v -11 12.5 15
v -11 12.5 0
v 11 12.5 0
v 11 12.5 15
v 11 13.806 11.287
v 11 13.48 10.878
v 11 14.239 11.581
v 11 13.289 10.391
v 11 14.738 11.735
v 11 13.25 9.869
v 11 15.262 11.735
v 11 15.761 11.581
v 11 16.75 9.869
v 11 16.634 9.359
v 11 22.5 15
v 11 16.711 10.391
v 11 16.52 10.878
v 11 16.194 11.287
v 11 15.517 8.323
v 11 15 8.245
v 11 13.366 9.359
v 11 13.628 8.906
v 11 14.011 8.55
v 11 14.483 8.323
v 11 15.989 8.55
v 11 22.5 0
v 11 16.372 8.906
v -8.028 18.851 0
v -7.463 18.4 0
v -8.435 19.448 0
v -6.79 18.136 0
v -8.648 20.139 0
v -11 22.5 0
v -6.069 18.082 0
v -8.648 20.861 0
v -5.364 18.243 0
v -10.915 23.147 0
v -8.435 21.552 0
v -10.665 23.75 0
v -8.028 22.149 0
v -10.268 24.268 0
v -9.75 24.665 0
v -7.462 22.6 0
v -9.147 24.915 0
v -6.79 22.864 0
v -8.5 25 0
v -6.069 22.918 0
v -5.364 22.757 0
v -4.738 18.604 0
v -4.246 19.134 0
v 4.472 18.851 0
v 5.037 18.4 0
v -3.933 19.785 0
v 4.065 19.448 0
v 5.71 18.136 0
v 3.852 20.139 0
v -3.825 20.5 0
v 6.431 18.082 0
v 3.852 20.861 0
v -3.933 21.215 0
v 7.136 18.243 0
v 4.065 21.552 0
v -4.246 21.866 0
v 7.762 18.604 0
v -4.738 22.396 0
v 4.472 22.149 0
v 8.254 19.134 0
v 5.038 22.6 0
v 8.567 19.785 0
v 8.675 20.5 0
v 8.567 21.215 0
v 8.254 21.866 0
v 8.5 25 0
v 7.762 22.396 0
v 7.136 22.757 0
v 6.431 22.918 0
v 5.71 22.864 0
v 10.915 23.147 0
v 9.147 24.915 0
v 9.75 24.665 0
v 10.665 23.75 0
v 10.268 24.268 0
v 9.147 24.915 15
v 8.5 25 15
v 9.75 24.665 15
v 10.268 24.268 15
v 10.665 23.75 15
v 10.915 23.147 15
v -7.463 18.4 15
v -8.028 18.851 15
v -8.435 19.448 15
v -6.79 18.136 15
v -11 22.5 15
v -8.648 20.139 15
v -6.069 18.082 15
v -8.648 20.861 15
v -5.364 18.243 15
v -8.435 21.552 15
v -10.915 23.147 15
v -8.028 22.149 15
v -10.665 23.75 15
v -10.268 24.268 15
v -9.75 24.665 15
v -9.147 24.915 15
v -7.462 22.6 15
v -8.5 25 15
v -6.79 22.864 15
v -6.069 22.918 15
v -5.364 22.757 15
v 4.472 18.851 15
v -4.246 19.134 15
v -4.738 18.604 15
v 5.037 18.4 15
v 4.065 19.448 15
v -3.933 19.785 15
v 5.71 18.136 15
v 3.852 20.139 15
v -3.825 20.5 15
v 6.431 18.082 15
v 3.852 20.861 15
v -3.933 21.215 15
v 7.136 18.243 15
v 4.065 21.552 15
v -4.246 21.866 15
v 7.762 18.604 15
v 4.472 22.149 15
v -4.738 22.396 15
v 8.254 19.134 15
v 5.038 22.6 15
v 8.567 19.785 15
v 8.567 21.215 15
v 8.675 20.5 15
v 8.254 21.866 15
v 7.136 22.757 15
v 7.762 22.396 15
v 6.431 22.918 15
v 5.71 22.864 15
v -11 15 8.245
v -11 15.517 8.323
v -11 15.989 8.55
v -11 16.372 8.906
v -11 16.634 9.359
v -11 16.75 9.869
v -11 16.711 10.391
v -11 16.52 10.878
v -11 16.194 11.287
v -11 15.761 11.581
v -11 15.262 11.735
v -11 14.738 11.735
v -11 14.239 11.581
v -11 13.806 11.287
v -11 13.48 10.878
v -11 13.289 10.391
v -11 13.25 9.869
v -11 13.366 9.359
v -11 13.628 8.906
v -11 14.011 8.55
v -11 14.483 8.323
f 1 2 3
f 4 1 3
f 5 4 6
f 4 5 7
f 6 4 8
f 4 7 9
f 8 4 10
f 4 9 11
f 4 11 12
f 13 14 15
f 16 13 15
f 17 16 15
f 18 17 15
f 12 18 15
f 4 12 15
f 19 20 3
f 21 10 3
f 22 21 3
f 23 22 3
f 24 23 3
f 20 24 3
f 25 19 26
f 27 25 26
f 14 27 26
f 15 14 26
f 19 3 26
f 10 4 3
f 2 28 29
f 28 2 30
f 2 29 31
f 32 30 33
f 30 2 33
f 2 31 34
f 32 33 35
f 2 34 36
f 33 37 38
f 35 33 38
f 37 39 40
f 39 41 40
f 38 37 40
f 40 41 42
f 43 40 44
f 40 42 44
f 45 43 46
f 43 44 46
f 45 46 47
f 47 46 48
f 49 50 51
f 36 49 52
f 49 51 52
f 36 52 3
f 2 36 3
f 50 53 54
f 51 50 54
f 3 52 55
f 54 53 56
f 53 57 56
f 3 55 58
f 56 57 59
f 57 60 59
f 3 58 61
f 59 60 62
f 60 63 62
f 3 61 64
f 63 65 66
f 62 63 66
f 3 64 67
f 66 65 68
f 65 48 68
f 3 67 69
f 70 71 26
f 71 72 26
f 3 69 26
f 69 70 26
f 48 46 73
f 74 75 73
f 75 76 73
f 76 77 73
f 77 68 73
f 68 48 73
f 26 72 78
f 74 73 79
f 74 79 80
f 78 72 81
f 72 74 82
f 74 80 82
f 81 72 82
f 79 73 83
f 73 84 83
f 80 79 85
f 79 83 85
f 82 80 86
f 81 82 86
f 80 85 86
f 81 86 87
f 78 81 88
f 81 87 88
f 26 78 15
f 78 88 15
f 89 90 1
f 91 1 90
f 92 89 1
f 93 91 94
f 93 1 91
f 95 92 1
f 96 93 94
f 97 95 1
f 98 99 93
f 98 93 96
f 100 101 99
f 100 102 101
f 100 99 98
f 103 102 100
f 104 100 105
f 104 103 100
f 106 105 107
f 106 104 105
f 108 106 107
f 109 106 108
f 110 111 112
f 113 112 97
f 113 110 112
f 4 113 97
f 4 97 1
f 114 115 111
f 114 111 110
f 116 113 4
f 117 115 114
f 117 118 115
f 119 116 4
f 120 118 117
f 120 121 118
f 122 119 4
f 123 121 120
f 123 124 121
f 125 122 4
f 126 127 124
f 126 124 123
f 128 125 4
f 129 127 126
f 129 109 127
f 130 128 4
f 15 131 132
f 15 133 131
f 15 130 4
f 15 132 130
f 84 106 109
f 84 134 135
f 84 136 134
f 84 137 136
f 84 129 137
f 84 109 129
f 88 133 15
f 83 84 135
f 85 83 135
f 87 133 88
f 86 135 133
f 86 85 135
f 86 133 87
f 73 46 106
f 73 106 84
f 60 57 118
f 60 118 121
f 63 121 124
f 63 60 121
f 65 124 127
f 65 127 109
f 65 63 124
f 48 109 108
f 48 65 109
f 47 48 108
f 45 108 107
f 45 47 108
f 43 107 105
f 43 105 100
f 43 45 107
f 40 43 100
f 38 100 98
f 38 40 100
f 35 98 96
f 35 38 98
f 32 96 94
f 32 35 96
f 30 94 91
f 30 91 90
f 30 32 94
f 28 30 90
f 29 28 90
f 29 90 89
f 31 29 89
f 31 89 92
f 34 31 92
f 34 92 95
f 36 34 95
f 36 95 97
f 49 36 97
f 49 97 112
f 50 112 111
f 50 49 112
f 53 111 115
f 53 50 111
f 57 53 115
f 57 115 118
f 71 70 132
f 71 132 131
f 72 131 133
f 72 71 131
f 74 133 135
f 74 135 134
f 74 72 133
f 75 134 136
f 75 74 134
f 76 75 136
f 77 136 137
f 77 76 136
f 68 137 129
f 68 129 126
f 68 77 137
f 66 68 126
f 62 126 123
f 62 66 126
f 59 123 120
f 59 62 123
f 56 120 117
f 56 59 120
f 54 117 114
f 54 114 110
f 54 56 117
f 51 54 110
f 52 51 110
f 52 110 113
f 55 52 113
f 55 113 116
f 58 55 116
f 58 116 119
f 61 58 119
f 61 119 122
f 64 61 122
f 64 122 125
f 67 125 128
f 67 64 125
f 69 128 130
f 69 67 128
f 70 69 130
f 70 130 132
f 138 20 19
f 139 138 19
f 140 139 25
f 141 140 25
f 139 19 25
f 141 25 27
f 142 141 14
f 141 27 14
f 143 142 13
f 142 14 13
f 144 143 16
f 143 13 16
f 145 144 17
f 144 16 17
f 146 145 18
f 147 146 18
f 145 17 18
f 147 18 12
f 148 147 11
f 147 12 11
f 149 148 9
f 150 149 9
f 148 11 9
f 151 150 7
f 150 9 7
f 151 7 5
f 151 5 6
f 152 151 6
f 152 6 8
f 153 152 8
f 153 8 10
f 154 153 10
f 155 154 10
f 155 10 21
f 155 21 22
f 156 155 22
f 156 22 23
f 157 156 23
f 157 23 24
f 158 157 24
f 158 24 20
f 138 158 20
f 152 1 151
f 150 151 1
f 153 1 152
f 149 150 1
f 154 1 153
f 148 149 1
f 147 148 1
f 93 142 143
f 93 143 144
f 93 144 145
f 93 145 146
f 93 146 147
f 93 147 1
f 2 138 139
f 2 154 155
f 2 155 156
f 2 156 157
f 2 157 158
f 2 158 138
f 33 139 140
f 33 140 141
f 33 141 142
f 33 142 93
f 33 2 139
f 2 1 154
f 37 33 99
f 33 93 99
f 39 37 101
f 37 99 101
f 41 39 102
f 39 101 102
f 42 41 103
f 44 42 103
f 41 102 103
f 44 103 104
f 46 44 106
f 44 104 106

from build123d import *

# Parameters (mm, degrees)
SKETCH2_W           = 22
SKETCH2_H           = 12.5
SKETCH2_R           = 2.425
BOSS_EXTRUDE1_DEPTH = 15
SKETCH3_R           = 1.755
CUT_EXTRUDE1_DEPTH  = 30
FILLET1_R           = 2.5


with BuildPart() as part:
    # Sketch2 → Boss-Extrude1 (new body)
    with BuildSketch(Plane.XY):
        with Locations((0, 18.75)):
            Rectangle(SKETCH2_W, SKETCH2_H)
        with Locations((-6.25, 20.5)):
            Circle(SKETCH2_R, mode=Mode.SUBTRACT)
        with Locations((6.25, 20.5)):
            Circle(SKETCH2_R, mode=Mode.SUBTRACT)
    extrude(amount=BOSS_EXTRUDE1_DEPTH)

    # Sketch3 → Cut-Extrude1 (cut)
    with BuildSketch(Plane(origin=(11, 0, 0), x_dir=(0, 0, -1), z_dir=(1, 0, 0))):
        with Locations((-10, 15)):
            Circle(SKETCH3_R)
    extrude(amount=-CUT_EXTRUDE1_DEPTH, mode=Mode.SUBTRACT)

    # Fillet1
    fillet1_edges = [part.edges().sort_by_distance(p)[0] for p in [
        (-11, 25, 7.5),
        (11, 25, 7.5),
    ]]
    fillet(fillet1_edges, radius=FILLET1_R)


solid = part.part
